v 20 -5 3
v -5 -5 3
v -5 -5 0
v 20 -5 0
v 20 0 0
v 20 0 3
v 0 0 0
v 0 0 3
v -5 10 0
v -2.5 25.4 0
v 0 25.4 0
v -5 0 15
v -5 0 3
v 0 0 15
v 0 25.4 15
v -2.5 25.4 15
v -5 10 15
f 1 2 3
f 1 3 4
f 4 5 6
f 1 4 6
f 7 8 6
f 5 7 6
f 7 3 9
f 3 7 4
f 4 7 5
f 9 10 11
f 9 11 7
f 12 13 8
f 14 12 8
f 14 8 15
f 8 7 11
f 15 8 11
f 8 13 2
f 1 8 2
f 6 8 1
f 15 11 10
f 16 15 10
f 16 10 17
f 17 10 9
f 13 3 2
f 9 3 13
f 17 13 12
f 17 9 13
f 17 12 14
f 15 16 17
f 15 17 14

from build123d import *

# Parameters (mm, degrees)
BOSS_EXTRUDE1_DEPTH = 15
SKETCH3_W           = 25
SKETCH3_H           = 3
BOSS_EXTRUDE2_DEPTH = 5


with BuildPart() as part:
    # Sketch2 → Boss-Extrude1 (new body)
    with BuildSketch(Plane.XY):
        Polygon((0, 0), (0, 25.4), (-2.5, 25.4), (-5, 10), (-5, 0), align=None)
    extrude(amount=BOSS_EXTRUDE1_DEPTH)

    # Sketch3 → Boss-Extrude2 (add)
    with BuildSketch(Plane.XZ):
        with Locations((7.5, 1.5)):
            Rectangle(SKETCH3_W, SKETCH3_H)
    extrude(amount=BOSS_EXTRUDE2_DEPTH)


solid = part.part
